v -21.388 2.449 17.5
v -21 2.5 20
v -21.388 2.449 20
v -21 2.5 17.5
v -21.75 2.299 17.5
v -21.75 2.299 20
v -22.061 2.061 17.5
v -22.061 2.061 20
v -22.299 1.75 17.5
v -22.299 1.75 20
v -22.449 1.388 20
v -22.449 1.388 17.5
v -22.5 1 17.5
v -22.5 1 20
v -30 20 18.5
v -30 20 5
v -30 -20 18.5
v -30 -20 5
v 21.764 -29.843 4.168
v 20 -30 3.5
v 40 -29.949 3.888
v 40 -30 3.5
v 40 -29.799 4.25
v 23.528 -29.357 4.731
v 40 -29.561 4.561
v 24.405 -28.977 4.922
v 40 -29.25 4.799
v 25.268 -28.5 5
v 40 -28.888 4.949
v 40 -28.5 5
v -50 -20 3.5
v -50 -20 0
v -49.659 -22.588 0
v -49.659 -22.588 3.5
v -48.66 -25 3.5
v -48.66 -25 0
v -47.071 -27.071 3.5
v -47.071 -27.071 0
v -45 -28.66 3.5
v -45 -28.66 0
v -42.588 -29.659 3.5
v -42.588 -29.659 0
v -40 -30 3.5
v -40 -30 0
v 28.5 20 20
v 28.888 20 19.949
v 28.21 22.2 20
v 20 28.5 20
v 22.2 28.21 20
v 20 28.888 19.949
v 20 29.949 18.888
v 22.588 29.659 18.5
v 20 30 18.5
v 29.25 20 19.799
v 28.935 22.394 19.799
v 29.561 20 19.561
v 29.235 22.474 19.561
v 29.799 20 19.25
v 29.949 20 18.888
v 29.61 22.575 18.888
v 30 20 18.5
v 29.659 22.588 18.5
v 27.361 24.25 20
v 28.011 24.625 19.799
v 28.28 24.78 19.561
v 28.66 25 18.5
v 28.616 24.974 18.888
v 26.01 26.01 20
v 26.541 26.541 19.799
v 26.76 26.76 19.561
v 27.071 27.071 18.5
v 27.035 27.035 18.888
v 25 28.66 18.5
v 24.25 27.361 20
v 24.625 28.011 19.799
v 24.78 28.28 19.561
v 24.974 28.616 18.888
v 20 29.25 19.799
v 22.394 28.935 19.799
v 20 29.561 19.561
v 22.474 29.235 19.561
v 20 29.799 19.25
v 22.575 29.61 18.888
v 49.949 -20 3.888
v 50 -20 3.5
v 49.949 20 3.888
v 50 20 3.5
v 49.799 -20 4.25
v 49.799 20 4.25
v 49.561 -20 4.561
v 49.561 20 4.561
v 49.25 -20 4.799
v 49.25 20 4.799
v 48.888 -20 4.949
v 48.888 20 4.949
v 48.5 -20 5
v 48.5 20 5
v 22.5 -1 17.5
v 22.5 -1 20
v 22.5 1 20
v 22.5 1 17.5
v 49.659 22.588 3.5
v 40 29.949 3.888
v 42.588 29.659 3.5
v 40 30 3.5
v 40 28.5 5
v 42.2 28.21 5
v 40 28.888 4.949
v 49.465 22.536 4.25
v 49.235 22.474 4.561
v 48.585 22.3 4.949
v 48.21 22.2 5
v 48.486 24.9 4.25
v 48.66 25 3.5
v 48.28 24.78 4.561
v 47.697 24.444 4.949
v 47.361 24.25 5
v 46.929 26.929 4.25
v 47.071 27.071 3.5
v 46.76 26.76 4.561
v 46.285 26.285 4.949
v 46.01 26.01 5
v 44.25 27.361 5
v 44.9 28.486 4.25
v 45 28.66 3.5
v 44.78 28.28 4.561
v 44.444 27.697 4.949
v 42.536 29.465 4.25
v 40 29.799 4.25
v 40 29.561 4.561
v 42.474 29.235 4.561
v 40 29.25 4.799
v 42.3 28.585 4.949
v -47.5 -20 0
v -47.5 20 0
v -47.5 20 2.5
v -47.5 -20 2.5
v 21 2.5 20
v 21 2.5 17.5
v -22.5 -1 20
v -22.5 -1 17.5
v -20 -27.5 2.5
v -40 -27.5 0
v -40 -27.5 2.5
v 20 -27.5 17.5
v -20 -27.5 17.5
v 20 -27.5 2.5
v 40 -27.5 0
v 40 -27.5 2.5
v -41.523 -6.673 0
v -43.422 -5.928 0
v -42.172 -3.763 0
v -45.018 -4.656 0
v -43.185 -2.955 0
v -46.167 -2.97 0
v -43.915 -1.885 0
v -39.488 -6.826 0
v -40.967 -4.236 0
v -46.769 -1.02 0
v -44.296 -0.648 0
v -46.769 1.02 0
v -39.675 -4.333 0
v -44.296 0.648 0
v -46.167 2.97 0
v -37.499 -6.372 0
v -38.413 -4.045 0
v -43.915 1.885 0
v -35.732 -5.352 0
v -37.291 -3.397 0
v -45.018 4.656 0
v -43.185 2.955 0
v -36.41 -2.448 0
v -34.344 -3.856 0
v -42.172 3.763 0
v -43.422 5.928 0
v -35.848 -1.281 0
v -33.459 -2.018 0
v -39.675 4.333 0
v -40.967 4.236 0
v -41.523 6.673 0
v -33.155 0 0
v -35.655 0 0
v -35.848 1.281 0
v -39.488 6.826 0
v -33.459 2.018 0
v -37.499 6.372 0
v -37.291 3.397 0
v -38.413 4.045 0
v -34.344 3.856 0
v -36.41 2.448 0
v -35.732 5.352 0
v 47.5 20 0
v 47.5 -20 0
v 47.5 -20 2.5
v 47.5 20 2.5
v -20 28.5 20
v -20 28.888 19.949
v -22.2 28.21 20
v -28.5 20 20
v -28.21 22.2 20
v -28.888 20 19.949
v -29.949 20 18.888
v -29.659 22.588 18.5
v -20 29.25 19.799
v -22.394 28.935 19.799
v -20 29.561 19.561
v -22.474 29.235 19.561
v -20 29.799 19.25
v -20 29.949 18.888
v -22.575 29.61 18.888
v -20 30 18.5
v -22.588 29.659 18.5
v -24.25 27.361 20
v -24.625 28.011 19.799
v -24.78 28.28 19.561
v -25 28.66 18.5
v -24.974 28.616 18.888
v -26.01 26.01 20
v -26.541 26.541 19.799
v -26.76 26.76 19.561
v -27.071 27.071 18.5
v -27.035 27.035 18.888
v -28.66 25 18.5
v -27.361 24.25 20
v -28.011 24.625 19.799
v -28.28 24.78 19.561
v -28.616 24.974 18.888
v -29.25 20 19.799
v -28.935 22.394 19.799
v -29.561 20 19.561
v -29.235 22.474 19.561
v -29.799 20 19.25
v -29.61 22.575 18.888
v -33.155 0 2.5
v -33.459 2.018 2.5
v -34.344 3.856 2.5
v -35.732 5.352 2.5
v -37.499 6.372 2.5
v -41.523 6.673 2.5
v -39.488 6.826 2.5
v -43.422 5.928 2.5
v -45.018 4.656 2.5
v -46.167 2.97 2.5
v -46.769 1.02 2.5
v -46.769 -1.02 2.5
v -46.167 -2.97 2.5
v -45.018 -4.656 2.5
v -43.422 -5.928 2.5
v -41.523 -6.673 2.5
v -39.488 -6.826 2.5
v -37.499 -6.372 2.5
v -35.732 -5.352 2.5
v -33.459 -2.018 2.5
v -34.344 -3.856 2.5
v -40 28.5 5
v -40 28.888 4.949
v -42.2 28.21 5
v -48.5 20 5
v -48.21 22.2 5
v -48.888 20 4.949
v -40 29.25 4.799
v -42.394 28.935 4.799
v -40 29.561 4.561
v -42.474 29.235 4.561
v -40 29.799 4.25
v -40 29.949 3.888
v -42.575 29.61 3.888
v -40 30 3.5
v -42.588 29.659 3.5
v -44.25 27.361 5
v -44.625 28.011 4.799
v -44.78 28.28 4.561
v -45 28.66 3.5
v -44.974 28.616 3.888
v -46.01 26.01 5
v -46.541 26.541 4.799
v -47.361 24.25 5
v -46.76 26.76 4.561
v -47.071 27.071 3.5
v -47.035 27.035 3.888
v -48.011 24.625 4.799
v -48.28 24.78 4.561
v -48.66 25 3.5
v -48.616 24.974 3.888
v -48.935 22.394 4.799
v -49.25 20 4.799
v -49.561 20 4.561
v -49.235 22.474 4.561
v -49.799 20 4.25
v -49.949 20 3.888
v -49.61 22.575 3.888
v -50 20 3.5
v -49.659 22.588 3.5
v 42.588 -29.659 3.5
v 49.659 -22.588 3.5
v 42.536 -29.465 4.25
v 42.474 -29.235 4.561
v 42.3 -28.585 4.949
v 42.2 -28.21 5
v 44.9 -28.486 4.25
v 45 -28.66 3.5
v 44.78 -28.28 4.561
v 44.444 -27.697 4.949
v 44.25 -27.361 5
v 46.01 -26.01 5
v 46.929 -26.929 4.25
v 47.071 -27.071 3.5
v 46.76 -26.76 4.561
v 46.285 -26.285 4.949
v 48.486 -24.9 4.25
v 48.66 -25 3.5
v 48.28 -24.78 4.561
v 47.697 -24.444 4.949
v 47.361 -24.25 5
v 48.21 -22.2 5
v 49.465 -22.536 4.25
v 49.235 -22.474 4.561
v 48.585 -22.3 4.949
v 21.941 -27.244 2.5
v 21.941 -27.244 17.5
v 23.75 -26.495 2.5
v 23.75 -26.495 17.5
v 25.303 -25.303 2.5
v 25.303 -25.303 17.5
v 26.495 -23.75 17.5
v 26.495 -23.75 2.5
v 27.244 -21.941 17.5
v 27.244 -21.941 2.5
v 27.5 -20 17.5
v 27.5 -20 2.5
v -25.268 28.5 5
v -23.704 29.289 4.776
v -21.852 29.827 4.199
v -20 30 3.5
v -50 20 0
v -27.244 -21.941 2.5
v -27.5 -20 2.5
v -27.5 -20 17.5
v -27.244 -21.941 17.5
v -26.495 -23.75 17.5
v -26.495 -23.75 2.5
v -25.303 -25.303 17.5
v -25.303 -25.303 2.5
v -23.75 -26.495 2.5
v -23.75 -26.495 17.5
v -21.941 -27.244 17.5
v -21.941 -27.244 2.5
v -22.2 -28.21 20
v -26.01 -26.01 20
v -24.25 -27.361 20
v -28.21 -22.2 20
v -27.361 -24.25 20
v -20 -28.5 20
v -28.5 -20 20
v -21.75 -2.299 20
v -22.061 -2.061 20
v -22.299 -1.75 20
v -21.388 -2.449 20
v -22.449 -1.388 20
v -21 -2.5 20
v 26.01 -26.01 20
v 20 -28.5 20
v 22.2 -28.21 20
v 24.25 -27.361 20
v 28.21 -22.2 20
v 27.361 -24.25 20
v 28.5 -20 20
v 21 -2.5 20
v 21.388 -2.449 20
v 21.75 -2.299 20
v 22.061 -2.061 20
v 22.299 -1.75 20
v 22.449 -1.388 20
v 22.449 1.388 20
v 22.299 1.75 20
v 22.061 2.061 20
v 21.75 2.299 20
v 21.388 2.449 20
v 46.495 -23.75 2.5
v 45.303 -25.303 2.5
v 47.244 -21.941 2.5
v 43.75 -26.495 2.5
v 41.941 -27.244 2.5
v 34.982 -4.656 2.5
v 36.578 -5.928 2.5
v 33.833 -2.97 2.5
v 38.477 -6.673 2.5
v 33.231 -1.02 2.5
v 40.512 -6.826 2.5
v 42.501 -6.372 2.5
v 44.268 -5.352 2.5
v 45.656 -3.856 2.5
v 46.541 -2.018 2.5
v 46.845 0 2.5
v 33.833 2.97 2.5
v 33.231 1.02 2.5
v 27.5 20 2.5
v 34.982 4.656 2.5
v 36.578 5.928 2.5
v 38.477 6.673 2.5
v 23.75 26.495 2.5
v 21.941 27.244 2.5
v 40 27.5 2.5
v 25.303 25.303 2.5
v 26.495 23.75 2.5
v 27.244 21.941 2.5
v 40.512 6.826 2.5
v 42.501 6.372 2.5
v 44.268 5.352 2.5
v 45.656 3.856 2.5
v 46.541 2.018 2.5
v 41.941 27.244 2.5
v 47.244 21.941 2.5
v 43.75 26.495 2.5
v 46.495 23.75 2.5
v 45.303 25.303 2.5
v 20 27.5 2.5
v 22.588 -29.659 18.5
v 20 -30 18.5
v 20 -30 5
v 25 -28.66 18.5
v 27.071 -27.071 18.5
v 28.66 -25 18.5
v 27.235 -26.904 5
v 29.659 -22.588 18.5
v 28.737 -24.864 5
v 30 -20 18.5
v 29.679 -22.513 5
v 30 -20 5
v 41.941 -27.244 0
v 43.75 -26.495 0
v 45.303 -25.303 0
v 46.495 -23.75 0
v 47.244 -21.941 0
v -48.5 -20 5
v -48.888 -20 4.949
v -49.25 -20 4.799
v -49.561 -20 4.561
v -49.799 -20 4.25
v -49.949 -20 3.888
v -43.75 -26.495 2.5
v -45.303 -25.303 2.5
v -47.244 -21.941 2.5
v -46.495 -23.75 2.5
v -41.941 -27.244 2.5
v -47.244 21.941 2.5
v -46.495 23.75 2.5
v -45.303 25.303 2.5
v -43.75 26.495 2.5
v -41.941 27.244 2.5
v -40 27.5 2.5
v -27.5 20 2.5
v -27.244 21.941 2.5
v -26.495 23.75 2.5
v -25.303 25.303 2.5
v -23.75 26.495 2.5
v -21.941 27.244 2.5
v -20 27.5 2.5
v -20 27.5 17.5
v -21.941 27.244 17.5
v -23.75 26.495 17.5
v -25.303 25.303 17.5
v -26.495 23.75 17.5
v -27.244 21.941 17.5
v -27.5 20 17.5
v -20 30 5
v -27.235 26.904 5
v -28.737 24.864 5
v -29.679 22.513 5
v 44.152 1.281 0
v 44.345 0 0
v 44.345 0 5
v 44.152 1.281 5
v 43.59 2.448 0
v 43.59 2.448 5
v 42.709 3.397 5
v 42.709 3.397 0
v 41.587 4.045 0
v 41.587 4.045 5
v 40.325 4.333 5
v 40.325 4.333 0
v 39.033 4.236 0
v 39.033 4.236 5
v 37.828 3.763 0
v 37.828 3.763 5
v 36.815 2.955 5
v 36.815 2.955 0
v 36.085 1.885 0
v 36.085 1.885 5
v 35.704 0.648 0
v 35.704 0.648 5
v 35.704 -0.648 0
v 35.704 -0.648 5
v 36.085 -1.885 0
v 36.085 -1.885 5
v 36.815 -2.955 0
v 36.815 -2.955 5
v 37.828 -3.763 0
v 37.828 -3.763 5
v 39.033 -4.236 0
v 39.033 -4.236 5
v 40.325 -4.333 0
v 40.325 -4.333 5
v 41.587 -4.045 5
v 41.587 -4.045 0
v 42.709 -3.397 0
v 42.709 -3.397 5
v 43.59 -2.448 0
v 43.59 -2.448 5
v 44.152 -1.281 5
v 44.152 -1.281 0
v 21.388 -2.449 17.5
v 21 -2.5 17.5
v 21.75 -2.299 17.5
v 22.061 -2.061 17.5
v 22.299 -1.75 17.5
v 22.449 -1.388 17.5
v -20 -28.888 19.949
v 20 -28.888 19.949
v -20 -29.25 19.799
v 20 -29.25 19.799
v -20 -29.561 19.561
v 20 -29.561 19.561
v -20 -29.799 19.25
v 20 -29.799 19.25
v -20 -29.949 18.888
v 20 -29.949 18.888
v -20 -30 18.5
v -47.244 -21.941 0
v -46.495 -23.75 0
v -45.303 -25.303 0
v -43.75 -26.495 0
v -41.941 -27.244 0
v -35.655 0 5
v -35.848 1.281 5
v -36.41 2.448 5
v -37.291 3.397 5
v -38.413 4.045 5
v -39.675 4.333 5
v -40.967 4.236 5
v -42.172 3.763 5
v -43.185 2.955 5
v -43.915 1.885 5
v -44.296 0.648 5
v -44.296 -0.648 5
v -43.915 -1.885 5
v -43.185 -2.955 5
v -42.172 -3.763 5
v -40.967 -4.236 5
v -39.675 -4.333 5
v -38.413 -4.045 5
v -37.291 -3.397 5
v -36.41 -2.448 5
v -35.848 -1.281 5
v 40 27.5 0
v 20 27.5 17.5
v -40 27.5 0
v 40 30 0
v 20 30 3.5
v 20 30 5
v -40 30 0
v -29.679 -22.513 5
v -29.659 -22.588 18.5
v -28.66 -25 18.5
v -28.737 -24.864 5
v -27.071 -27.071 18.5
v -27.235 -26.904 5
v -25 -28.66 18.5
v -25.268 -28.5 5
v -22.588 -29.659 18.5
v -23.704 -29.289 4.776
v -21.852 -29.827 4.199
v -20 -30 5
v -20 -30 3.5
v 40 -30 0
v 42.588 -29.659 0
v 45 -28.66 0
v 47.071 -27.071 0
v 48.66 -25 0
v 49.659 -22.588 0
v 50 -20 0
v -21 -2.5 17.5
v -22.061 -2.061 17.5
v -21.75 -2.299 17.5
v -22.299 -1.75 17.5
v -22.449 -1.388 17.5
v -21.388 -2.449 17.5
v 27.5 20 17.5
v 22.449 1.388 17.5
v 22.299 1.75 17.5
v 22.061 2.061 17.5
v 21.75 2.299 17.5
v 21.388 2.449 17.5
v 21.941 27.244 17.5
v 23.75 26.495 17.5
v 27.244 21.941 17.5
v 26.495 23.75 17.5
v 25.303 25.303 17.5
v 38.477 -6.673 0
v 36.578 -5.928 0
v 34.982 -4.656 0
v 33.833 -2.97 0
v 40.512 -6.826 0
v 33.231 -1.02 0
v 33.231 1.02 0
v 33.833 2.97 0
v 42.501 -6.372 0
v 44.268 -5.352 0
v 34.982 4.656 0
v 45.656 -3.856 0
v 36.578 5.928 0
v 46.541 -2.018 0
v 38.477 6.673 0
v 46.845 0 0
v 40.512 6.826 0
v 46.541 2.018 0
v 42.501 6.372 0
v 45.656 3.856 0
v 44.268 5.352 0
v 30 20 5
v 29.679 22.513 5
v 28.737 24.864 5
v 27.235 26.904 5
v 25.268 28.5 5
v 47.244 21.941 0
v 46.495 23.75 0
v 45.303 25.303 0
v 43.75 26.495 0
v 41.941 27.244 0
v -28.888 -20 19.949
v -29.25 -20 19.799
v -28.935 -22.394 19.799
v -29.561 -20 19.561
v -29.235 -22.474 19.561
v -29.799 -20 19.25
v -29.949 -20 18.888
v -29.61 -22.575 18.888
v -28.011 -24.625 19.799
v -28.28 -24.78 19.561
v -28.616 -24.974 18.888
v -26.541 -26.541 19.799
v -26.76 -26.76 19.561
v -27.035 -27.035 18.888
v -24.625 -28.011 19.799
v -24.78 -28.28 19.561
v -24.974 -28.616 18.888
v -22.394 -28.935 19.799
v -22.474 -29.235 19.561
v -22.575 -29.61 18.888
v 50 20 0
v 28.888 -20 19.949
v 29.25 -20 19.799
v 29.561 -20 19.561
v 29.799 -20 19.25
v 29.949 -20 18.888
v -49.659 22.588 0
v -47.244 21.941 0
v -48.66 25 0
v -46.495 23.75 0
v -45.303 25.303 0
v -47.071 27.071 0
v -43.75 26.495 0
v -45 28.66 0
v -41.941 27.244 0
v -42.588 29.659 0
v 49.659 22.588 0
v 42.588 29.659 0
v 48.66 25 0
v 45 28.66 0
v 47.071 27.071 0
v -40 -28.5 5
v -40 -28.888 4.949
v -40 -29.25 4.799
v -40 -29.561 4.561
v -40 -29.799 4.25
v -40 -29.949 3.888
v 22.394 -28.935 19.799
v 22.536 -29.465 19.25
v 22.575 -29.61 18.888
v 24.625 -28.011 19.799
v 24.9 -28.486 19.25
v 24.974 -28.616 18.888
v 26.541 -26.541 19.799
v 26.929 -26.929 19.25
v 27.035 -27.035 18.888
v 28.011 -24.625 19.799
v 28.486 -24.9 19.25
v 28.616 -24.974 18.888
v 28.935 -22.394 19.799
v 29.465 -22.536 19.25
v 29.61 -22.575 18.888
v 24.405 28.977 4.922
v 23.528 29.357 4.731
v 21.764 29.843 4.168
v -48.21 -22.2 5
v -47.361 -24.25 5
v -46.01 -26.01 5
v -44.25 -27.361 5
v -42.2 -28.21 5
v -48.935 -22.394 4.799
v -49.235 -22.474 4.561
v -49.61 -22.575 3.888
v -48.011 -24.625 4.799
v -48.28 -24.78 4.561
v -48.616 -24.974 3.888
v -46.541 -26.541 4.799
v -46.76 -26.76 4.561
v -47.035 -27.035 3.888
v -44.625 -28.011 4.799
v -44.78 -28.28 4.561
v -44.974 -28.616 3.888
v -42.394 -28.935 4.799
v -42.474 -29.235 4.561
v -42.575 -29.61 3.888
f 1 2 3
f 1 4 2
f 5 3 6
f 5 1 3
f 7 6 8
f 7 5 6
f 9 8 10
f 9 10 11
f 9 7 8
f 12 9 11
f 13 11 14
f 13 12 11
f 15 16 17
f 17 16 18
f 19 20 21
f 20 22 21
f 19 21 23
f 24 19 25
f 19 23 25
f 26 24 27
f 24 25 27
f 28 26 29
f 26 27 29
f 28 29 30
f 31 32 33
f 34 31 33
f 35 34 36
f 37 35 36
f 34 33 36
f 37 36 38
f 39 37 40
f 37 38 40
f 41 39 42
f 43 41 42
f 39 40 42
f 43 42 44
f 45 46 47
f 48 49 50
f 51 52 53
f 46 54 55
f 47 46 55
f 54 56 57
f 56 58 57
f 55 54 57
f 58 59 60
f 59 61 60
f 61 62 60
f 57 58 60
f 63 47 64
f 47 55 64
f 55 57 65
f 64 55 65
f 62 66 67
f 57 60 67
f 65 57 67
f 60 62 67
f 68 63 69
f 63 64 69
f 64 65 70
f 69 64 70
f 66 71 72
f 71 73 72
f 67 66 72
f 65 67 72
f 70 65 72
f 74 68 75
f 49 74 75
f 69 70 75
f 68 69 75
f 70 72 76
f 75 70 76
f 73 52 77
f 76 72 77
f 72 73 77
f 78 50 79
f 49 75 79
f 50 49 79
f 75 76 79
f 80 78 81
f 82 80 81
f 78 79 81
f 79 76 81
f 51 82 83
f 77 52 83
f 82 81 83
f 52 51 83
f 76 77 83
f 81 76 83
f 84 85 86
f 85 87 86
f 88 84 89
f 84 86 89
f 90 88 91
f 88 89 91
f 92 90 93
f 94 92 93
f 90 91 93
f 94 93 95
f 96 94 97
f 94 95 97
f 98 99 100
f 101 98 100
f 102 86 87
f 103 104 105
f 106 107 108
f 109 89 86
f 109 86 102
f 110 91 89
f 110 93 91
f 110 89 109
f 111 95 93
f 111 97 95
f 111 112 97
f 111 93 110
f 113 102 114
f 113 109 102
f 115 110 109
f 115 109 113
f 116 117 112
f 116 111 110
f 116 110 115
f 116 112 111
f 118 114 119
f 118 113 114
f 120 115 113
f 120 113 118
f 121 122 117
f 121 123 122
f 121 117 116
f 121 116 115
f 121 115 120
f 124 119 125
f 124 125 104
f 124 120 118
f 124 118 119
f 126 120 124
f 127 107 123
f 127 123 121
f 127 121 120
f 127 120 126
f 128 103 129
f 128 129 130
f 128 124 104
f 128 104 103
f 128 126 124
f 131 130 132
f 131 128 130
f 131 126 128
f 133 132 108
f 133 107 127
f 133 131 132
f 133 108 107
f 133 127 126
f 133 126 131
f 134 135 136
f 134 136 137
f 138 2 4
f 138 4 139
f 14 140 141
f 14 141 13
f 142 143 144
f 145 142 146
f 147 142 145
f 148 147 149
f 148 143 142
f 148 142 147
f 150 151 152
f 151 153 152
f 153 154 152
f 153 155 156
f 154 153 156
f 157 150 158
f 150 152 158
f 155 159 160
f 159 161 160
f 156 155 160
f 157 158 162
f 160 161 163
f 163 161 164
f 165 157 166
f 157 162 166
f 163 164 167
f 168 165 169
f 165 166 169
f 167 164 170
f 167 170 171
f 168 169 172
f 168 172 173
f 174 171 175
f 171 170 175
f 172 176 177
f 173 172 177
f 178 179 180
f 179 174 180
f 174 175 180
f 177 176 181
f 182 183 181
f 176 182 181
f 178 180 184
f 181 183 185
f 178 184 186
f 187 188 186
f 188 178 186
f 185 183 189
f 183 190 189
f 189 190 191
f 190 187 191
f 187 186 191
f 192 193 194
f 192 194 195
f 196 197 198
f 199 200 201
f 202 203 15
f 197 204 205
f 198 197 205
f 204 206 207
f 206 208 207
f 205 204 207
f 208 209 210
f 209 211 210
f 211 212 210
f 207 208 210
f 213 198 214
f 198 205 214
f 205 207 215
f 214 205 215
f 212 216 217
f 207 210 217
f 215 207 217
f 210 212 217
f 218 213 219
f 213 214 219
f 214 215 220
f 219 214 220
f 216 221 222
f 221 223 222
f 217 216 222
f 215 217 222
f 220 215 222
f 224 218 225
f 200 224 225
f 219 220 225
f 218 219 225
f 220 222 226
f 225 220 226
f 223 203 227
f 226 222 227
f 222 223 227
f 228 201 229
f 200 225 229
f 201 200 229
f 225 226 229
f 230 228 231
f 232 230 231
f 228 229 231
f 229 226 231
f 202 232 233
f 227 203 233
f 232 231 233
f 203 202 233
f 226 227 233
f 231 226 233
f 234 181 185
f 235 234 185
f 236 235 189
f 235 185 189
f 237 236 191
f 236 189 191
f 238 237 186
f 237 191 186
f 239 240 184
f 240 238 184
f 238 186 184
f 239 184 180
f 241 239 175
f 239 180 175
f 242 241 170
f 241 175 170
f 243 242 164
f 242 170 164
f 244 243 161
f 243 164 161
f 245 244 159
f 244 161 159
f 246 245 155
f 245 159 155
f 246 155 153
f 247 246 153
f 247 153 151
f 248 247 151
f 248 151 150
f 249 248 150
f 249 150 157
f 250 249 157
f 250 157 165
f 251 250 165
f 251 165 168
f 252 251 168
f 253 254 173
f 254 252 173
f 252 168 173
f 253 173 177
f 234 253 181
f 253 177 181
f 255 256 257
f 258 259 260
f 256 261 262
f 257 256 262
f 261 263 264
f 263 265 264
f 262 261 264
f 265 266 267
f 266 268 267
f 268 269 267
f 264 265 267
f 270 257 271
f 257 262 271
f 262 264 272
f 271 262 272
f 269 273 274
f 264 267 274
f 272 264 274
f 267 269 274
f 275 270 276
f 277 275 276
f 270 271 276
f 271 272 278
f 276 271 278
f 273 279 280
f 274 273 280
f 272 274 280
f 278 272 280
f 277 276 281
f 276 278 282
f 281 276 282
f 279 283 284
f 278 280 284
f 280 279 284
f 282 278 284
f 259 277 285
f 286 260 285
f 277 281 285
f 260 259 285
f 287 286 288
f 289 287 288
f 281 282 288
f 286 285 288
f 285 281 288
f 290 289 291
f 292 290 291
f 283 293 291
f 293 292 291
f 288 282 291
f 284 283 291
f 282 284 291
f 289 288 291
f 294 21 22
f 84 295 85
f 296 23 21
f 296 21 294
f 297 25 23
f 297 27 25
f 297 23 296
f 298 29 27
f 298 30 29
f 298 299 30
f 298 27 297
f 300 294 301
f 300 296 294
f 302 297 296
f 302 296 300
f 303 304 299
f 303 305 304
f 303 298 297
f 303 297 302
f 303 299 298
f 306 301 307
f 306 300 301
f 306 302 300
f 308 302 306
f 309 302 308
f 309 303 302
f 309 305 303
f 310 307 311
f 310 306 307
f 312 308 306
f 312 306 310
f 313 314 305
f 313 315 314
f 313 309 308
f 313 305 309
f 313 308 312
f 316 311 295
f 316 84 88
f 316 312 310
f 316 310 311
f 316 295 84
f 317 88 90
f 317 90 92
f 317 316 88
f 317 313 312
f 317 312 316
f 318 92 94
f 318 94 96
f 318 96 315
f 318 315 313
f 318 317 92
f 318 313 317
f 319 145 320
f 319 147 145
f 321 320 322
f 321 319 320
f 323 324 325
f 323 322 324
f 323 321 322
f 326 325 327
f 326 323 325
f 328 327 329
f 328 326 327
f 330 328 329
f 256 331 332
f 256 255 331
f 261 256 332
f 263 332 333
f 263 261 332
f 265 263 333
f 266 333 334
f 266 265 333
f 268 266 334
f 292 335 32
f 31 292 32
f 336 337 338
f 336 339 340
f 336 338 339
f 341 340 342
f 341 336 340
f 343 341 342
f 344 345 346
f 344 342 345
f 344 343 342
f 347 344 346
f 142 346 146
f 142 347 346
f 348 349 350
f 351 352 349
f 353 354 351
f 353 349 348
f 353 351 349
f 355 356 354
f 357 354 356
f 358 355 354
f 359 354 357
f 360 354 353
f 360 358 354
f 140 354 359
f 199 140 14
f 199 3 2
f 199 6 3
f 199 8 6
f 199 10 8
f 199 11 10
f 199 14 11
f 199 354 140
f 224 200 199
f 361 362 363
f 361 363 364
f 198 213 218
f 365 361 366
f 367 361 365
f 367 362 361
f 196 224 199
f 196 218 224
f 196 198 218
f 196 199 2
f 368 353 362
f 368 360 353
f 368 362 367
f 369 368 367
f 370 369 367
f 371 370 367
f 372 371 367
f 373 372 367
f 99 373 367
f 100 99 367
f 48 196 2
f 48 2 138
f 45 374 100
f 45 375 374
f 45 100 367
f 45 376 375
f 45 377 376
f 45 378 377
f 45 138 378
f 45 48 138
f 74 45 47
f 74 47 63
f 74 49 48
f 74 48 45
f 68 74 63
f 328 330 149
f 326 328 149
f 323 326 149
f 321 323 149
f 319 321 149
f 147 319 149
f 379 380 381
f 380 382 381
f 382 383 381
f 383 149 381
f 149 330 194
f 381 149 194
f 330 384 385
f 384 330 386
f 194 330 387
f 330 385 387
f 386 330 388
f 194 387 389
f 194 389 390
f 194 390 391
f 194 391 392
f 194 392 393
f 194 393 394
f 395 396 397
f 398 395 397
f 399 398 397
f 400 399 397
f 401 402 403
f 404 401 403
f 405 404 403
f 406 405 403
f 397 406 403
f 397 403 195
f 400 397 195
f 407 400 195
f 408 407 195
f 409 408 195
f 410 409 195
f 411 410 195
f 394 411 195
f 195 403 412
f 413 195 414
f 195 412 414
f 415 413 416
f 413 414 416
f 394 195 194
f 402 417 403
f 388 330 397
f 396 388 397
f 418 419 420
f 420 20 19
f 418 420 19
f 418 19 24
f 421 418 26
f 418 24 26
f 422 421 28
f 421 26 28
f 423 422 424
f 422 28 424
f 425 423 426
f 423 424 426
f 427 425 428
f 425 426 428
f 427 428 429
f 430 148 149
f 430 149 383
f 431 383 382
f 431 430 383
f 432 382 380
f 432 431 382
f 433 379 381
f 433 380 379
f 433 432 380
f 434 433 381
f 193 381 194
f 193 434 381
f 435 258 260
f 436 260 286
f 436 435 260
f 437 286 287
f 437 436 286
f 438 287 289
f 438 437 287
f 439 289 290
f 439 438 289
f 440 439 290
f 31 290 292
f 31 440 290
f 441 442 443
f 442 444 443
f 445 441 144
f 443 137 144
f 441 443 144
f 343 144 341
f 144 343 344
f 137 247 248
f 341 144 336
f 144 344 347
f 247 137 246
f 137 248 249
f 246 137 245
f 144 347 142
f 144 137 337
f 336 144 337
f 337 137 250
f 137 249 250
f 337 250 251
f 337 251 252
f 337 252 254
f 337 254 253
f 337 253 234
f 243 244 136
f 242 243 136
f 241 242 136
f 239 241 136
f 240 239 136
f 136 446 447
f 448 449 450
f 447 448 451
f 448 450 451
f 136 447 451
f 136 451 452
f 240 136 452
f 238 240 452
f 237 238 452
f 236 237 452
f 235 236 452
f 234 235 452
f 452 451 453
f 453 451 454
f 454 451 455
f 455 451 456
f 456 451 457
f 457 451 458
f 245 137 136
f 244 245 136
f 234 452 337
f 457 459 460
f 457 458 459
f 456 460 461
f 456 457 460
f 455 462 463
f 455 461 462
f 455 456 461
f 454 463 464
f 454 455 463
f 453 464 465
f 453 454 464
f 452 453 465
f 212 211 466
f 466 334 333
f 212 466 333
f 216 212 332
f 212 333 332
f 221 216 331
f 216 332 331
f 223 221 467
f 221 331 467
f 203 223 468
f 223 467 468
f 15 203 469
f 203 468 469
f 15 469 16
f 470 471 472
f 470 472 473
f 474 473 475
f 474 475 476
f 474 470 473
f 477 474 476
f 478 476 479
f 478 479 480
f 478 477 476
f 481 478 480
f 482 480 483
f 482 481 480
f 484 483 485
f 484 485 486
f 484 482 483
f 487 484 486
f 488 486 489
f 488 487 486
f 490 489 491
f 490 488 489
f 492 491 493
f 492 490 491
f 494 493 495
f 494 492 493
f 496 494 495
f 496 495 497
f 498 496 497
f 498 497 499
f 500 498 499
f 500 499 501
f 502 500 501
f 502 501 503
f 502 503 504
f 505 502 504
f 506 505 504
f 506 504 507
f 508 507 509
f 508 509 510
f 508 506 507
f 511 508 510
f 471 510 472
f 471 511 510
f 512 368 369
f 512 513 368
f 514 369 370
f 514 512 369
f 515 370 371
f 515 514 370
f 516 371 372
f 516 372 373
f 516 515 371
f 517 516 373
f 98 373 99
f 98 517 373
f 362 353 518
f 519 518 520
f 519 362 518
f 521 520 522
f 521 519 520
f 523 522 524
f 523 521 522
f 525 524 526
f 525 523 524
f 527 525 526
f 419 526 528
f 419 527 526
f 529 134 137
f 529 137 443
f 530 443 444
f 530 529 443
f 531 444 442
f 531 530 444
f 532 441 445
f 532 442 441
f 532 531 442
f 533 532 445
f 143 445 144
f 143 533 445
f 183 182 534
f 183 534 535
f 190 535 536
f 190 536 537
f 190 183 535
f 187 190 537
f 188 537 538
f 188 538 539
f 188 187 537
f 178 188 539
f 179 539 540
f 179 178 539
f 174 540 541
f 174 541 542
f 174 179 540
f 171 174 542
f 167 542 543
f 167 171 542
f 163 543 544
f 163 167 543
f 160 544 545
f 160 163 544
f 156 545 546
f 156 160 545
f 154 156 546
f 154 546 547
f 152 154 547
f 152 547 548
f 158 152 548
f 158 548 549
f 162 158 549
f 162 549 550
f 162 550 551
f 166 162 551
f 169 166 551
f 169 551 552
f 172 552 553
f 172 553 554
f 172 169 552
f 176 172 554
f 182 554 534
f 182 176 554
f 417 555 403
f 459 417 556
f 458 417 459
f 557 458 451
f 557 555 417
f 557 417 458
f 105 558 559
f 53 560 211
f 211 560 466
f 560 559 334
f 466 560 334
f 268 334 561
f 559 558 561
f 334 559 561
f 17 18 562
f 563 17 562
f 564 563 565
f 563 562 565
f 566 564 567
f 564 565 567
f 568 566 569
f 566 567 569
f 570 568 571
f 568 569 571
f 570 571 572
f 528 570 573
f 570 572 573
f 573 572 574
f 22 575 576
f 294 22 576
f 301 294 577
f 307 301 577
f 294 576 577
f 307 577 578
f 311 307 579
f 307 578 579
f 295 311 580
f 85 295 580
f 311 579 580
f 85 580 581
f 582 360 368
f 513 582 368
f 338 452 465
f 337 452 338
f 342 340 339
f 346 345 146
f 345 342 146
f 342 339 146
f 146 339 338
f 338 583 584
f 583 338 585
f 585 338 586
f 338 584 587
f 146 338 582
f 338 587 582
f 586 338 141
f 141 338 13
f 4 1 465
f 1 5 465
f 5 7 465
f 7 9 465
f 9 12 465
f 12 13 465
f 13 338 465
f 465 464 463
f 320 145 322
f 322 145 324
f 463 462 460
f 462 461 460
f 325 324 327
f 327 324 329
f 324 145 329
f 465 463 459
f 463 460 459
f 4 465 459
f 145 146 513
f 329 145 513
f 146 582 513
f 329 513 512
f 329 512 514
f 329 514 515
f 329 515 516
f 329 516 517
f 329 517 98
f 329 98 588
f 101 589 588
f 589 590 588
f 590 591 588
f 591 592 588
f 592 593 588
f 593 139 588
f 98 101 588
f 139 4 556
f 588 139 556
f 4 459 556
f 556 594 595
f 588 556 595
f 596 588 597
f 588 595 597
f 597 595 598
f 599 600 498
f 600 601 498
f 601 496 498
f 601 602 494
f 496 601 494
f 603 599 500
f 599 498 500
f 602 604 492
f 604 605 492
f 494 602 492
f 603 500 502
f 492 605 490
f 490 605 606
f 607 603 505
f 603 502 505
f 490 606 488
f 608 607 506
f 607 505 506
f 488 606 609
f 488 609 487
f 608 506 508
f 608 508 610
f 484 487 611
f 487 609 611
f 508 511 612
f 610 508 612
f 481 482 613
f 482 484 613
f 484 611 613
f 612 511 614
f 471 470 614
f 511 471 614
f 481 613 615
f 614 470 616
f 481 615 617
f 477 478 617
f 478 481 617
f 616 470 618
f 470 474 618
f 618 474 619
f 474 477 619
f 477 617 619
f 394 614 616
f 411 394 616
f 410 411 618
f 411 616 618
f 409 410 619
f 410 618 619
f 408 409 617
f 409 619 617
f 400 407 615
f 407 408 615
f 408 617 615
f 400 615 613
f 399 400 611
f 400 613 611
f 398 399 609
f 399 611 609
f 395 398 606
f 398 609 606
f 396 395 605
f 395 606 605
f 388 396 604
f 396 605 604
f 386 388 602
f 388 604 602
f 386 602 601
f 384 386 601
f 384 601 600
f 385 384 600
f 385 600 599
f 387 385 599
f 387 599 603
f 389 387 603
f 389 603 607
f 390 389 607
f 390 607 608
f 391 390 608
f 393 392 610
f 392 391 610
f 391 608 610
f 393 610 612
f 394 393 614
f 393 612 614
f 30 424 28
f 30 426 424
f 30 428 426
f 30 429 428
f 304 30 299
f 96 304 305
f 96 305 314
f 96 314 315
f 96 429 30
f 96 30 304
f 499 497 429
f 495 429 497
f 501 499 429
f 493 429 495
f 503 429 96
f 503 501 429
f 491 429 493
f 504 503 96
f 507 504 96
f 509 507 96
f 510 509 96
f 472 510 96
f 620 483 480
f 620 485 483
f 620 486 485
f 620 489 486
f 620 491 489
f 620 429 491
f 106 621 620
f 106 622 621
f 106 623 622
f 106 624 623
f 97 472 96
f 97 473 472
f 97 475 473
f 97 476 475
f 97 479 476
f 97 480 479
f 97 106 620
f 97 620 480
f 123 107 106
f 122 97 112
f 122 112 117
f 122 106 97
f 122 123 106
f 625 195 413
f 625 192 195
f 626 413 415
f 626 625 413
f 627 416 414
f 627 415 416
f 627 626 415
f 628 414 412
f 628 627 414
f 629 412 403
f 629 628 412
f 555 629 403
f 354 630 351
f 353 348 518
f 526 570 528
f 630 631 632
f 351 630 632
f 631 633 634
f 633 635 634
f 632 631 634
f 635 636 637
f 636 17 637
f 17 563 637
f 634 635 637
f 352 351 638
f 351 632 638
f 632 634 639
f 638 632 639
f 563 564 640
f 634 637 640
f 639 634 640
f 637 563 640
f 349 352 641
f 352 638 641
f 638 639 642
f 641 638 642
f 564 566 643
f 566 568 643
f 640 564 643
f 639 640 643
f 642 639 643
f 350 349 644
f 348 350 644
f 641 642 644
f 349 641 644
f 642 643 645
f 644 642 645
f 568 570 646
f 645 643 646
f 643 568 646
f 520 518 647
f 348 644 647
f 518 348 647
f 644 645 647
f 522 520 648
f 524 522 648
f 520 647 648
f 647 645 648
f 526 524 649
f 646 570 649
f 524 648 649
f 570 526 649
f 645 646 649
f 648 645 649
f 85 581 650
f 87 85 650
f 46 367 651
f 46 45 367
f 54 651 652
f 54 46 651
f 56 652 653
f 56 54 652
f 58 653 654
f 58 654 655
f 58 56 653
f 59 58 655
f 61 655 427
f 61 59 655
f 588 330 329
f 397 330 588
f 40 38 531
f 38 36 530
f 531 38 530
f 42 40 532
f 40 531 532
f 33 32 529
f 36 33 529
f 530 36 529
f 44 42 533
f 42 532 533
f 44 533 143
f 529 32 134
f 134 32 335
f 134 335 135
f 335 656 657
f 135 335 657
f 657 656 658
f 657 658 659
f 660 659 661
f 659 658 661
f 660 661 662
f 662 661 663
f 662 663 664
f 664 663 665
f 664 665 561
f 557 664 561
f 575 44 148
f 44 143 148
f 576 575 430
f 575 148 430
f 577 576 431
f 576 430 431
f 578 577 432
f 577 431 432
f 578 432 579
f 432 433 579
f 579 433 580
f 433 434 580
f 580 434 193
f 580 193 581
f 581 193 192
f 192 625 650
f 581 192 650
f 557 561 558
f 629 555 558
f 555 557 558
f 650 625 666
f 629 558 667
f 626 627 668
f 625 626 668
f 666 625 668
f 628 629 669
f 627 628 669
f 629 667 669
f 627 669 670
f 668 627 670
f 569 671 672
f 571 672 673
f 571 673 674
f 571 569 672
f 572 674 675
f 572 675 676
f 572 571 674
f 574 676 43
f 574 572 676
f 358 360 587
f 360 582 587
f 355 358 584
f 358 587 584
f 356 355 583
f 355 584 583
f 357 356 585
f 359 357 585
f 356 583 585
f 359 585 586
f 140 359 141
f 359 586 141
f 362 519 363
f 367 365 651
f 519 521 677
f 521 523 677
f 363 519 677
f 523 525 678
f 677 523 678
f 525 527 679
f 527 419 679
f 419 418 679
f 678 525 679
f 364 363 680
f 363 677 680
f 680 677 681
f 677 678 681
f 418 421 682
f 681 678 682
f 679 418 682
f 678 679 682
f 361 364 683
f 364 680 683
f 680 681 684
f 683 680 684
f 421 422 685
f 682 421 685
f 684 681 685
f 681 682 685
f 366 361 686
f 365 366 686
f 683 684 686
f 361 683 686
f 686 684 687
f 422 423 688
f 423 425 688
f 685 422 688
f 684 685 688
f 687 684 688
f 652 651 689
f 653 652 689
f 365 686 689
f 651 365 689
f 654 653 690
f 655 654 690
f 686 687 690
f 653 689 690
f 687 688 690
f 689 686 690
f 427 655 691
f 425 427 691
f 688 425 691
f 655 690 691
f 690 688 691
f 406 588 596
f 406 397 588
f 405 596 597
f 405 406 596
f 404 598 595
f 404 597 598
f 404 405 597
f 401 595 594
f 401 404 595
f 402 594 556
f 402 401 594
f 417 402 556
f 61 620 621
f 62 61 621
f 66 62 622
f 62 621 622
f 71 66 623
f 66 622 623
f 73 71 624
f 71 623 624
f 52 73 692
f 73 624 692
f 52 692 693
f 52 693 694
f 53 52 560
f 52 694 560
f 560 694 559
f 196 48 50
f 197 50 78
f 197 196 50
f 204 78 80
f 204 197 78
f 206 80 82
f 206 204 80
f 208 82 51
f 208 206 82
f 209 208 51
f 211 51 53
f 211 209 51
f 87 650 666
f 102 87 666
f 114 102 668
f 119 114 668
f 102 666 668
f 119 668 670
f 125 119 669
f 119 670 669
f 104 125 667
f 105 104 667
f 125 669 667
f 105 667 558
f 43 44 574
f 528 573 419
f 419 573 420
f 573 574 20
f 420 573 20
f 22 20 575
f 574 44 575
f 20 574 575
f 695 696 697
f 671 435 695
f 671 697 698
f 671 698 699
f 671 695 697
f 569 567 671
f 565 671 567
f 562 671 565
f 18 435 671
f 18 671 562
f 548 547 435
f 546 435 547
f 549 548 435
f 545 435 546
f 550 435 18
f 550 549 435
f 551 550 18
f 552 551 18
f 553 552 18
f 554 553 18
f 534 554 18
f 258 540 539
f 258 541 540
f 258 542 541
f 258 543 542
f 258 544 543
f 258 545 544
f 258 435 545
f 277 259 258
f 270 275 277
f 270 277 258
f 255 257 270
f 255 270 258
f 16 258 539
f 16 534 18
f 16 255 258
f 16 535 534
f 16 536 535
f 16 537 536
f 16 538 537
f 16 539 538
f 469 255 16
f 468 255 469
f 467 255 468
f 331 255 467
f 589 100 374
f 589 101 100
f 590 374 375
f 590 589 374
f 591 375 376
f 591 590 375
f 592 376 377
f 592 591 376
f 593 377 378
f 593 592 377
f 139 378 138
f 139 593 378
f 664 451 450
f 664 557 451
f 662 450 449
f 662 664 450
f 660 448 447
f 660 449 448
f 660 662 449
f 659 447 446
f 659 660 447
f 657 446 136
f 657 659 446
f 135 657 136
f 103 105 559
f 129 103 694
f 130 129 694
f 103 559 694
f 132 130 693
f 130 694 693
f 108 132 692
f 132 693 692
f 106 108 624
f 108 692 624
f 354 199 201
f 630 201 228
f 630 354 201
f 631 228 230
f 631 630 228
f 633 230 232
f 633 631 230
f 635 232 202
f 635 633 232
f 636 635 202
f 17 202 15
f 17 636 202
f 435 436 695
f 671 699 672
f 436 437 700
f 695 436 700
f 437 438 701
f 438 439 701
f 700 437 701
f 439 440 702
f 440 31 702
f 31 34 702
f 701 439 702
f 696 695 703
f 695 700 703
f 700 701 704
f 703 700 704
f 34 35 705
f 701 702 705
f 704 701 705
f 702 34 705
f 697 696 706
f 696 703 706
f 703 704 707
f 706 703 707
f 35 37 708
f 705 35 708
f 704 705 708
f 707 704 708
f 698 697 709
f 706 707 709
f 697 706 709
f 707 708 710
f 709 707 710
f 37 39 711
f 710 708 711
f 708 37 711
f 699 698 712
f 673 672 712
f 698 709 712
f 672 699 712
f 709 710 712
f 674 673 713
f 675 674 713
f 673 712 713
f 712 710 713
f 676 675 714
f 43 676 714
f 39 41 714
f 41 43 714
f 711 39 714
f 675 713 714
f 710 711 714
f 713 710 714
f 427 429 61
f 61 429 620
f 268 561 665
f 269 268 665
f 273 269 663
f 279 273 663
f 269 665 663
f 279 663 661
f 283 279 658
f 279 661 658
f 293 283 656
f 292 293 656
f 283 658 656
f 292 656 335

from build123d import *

# Parameters (mm, degrees)
F0_R     = 4.345
F1_DEPTH = 5
F3_DEPTH = 15
F4_T     = -2.5
F5_W     = 45
F5_H     = 5
F6_DEPTH = 20.001
F7_R     = 1.5


with BuildPart() as f1:
    # F0 (on Top) → F1 (new body)
    with BuildSketch(Plane.XY):
        with BuildLine():
            Line((40, 30), (-40, 30))
            ThreePointArc((-40, 30), (-47.0710678119, 27.0710678119), (-50, 20))
            Line((-50, 20), (-50, -20))
            ThreePointArc((-50, -20), (-47.0710678119, -27.0710678119), (-40, -30))
            Line((-40, -30), (40, -30))
            ThreePointArc((40, -30), (47.0710678119, -27.0710678119), (50, -20))
            Line((50, -20), (50, 20))
            ThreePointArc((50, 20), (47.0710678119, 27.0710678119), (40, 30))
        make_face()
        with Locations((-40, 0)):
            Circle(F0_R, mode=Mode.SUBTRACT)
        with Locations((40, 0)):
            Circle(F0_R, mode=Mode.SUBTRACT)
    extrude(amount=F1_DEPTH)

    # F2 (on face) → F3 (join)
    with BuildSketch(Plane.XY.offset(5)):
        with BuildLine():
            Line((20, 30), (-20, 30))
            ThreePointArc((-20, 30), (-27.0710678119, 27.0710678119), (-30, 20))
            Line((-30, 20), (-30, -20))
            ThreePointArc((-30, -20), (-27.0710678119, -27.0710678119), (-20, -30))
            Line((-20, -30), (20, -30))
            ThreePointArc((20, -30), (27.0710678119, -27.0710678119), (30, -20))
            Line((30, -20), (30, 20))
            ThreePointArc((30, 20), (27.0710678119, 27.0710678119), (20, 30))
        make_face()
    extrude(amount=F3_DEPTH)

    # F4
    f4_openings = [f1.faces().sort_by_distance(p)[0] for p in [
        (0, 0, 0),
    ]]
    offset(amount=F4_T, openings=f4_openings, kind=Kind.INTERSECTION)

    # F5 (on face) → F6 (cut, through all)
    with BuildSketch(Plane.XY.offset(20)):
        Rectangle(F5_W, F5_H)
    extrude(amount=-F6_DEPTH, mode=Mode.SUBTRACT)

    # F7
    f7_edges = [f1.edges().sort_by_distance(p)[0] for p in [
        (-22.5, 2.5, 18.75),
        (-22.5, -2.5, 18.75),
        (22.5, 2.5, 18.75),
        (22.5, -2.5, 18.75),
        (30, 0, 20),
        (27.071068, -27.071068, 20),
        (0, -30, 20),
        (47.071068, 27.071068, 5),
        (-30, -30, 5),
    ]]
    fillet(f7_edges, radius=F7_R)


solid = f1.part
